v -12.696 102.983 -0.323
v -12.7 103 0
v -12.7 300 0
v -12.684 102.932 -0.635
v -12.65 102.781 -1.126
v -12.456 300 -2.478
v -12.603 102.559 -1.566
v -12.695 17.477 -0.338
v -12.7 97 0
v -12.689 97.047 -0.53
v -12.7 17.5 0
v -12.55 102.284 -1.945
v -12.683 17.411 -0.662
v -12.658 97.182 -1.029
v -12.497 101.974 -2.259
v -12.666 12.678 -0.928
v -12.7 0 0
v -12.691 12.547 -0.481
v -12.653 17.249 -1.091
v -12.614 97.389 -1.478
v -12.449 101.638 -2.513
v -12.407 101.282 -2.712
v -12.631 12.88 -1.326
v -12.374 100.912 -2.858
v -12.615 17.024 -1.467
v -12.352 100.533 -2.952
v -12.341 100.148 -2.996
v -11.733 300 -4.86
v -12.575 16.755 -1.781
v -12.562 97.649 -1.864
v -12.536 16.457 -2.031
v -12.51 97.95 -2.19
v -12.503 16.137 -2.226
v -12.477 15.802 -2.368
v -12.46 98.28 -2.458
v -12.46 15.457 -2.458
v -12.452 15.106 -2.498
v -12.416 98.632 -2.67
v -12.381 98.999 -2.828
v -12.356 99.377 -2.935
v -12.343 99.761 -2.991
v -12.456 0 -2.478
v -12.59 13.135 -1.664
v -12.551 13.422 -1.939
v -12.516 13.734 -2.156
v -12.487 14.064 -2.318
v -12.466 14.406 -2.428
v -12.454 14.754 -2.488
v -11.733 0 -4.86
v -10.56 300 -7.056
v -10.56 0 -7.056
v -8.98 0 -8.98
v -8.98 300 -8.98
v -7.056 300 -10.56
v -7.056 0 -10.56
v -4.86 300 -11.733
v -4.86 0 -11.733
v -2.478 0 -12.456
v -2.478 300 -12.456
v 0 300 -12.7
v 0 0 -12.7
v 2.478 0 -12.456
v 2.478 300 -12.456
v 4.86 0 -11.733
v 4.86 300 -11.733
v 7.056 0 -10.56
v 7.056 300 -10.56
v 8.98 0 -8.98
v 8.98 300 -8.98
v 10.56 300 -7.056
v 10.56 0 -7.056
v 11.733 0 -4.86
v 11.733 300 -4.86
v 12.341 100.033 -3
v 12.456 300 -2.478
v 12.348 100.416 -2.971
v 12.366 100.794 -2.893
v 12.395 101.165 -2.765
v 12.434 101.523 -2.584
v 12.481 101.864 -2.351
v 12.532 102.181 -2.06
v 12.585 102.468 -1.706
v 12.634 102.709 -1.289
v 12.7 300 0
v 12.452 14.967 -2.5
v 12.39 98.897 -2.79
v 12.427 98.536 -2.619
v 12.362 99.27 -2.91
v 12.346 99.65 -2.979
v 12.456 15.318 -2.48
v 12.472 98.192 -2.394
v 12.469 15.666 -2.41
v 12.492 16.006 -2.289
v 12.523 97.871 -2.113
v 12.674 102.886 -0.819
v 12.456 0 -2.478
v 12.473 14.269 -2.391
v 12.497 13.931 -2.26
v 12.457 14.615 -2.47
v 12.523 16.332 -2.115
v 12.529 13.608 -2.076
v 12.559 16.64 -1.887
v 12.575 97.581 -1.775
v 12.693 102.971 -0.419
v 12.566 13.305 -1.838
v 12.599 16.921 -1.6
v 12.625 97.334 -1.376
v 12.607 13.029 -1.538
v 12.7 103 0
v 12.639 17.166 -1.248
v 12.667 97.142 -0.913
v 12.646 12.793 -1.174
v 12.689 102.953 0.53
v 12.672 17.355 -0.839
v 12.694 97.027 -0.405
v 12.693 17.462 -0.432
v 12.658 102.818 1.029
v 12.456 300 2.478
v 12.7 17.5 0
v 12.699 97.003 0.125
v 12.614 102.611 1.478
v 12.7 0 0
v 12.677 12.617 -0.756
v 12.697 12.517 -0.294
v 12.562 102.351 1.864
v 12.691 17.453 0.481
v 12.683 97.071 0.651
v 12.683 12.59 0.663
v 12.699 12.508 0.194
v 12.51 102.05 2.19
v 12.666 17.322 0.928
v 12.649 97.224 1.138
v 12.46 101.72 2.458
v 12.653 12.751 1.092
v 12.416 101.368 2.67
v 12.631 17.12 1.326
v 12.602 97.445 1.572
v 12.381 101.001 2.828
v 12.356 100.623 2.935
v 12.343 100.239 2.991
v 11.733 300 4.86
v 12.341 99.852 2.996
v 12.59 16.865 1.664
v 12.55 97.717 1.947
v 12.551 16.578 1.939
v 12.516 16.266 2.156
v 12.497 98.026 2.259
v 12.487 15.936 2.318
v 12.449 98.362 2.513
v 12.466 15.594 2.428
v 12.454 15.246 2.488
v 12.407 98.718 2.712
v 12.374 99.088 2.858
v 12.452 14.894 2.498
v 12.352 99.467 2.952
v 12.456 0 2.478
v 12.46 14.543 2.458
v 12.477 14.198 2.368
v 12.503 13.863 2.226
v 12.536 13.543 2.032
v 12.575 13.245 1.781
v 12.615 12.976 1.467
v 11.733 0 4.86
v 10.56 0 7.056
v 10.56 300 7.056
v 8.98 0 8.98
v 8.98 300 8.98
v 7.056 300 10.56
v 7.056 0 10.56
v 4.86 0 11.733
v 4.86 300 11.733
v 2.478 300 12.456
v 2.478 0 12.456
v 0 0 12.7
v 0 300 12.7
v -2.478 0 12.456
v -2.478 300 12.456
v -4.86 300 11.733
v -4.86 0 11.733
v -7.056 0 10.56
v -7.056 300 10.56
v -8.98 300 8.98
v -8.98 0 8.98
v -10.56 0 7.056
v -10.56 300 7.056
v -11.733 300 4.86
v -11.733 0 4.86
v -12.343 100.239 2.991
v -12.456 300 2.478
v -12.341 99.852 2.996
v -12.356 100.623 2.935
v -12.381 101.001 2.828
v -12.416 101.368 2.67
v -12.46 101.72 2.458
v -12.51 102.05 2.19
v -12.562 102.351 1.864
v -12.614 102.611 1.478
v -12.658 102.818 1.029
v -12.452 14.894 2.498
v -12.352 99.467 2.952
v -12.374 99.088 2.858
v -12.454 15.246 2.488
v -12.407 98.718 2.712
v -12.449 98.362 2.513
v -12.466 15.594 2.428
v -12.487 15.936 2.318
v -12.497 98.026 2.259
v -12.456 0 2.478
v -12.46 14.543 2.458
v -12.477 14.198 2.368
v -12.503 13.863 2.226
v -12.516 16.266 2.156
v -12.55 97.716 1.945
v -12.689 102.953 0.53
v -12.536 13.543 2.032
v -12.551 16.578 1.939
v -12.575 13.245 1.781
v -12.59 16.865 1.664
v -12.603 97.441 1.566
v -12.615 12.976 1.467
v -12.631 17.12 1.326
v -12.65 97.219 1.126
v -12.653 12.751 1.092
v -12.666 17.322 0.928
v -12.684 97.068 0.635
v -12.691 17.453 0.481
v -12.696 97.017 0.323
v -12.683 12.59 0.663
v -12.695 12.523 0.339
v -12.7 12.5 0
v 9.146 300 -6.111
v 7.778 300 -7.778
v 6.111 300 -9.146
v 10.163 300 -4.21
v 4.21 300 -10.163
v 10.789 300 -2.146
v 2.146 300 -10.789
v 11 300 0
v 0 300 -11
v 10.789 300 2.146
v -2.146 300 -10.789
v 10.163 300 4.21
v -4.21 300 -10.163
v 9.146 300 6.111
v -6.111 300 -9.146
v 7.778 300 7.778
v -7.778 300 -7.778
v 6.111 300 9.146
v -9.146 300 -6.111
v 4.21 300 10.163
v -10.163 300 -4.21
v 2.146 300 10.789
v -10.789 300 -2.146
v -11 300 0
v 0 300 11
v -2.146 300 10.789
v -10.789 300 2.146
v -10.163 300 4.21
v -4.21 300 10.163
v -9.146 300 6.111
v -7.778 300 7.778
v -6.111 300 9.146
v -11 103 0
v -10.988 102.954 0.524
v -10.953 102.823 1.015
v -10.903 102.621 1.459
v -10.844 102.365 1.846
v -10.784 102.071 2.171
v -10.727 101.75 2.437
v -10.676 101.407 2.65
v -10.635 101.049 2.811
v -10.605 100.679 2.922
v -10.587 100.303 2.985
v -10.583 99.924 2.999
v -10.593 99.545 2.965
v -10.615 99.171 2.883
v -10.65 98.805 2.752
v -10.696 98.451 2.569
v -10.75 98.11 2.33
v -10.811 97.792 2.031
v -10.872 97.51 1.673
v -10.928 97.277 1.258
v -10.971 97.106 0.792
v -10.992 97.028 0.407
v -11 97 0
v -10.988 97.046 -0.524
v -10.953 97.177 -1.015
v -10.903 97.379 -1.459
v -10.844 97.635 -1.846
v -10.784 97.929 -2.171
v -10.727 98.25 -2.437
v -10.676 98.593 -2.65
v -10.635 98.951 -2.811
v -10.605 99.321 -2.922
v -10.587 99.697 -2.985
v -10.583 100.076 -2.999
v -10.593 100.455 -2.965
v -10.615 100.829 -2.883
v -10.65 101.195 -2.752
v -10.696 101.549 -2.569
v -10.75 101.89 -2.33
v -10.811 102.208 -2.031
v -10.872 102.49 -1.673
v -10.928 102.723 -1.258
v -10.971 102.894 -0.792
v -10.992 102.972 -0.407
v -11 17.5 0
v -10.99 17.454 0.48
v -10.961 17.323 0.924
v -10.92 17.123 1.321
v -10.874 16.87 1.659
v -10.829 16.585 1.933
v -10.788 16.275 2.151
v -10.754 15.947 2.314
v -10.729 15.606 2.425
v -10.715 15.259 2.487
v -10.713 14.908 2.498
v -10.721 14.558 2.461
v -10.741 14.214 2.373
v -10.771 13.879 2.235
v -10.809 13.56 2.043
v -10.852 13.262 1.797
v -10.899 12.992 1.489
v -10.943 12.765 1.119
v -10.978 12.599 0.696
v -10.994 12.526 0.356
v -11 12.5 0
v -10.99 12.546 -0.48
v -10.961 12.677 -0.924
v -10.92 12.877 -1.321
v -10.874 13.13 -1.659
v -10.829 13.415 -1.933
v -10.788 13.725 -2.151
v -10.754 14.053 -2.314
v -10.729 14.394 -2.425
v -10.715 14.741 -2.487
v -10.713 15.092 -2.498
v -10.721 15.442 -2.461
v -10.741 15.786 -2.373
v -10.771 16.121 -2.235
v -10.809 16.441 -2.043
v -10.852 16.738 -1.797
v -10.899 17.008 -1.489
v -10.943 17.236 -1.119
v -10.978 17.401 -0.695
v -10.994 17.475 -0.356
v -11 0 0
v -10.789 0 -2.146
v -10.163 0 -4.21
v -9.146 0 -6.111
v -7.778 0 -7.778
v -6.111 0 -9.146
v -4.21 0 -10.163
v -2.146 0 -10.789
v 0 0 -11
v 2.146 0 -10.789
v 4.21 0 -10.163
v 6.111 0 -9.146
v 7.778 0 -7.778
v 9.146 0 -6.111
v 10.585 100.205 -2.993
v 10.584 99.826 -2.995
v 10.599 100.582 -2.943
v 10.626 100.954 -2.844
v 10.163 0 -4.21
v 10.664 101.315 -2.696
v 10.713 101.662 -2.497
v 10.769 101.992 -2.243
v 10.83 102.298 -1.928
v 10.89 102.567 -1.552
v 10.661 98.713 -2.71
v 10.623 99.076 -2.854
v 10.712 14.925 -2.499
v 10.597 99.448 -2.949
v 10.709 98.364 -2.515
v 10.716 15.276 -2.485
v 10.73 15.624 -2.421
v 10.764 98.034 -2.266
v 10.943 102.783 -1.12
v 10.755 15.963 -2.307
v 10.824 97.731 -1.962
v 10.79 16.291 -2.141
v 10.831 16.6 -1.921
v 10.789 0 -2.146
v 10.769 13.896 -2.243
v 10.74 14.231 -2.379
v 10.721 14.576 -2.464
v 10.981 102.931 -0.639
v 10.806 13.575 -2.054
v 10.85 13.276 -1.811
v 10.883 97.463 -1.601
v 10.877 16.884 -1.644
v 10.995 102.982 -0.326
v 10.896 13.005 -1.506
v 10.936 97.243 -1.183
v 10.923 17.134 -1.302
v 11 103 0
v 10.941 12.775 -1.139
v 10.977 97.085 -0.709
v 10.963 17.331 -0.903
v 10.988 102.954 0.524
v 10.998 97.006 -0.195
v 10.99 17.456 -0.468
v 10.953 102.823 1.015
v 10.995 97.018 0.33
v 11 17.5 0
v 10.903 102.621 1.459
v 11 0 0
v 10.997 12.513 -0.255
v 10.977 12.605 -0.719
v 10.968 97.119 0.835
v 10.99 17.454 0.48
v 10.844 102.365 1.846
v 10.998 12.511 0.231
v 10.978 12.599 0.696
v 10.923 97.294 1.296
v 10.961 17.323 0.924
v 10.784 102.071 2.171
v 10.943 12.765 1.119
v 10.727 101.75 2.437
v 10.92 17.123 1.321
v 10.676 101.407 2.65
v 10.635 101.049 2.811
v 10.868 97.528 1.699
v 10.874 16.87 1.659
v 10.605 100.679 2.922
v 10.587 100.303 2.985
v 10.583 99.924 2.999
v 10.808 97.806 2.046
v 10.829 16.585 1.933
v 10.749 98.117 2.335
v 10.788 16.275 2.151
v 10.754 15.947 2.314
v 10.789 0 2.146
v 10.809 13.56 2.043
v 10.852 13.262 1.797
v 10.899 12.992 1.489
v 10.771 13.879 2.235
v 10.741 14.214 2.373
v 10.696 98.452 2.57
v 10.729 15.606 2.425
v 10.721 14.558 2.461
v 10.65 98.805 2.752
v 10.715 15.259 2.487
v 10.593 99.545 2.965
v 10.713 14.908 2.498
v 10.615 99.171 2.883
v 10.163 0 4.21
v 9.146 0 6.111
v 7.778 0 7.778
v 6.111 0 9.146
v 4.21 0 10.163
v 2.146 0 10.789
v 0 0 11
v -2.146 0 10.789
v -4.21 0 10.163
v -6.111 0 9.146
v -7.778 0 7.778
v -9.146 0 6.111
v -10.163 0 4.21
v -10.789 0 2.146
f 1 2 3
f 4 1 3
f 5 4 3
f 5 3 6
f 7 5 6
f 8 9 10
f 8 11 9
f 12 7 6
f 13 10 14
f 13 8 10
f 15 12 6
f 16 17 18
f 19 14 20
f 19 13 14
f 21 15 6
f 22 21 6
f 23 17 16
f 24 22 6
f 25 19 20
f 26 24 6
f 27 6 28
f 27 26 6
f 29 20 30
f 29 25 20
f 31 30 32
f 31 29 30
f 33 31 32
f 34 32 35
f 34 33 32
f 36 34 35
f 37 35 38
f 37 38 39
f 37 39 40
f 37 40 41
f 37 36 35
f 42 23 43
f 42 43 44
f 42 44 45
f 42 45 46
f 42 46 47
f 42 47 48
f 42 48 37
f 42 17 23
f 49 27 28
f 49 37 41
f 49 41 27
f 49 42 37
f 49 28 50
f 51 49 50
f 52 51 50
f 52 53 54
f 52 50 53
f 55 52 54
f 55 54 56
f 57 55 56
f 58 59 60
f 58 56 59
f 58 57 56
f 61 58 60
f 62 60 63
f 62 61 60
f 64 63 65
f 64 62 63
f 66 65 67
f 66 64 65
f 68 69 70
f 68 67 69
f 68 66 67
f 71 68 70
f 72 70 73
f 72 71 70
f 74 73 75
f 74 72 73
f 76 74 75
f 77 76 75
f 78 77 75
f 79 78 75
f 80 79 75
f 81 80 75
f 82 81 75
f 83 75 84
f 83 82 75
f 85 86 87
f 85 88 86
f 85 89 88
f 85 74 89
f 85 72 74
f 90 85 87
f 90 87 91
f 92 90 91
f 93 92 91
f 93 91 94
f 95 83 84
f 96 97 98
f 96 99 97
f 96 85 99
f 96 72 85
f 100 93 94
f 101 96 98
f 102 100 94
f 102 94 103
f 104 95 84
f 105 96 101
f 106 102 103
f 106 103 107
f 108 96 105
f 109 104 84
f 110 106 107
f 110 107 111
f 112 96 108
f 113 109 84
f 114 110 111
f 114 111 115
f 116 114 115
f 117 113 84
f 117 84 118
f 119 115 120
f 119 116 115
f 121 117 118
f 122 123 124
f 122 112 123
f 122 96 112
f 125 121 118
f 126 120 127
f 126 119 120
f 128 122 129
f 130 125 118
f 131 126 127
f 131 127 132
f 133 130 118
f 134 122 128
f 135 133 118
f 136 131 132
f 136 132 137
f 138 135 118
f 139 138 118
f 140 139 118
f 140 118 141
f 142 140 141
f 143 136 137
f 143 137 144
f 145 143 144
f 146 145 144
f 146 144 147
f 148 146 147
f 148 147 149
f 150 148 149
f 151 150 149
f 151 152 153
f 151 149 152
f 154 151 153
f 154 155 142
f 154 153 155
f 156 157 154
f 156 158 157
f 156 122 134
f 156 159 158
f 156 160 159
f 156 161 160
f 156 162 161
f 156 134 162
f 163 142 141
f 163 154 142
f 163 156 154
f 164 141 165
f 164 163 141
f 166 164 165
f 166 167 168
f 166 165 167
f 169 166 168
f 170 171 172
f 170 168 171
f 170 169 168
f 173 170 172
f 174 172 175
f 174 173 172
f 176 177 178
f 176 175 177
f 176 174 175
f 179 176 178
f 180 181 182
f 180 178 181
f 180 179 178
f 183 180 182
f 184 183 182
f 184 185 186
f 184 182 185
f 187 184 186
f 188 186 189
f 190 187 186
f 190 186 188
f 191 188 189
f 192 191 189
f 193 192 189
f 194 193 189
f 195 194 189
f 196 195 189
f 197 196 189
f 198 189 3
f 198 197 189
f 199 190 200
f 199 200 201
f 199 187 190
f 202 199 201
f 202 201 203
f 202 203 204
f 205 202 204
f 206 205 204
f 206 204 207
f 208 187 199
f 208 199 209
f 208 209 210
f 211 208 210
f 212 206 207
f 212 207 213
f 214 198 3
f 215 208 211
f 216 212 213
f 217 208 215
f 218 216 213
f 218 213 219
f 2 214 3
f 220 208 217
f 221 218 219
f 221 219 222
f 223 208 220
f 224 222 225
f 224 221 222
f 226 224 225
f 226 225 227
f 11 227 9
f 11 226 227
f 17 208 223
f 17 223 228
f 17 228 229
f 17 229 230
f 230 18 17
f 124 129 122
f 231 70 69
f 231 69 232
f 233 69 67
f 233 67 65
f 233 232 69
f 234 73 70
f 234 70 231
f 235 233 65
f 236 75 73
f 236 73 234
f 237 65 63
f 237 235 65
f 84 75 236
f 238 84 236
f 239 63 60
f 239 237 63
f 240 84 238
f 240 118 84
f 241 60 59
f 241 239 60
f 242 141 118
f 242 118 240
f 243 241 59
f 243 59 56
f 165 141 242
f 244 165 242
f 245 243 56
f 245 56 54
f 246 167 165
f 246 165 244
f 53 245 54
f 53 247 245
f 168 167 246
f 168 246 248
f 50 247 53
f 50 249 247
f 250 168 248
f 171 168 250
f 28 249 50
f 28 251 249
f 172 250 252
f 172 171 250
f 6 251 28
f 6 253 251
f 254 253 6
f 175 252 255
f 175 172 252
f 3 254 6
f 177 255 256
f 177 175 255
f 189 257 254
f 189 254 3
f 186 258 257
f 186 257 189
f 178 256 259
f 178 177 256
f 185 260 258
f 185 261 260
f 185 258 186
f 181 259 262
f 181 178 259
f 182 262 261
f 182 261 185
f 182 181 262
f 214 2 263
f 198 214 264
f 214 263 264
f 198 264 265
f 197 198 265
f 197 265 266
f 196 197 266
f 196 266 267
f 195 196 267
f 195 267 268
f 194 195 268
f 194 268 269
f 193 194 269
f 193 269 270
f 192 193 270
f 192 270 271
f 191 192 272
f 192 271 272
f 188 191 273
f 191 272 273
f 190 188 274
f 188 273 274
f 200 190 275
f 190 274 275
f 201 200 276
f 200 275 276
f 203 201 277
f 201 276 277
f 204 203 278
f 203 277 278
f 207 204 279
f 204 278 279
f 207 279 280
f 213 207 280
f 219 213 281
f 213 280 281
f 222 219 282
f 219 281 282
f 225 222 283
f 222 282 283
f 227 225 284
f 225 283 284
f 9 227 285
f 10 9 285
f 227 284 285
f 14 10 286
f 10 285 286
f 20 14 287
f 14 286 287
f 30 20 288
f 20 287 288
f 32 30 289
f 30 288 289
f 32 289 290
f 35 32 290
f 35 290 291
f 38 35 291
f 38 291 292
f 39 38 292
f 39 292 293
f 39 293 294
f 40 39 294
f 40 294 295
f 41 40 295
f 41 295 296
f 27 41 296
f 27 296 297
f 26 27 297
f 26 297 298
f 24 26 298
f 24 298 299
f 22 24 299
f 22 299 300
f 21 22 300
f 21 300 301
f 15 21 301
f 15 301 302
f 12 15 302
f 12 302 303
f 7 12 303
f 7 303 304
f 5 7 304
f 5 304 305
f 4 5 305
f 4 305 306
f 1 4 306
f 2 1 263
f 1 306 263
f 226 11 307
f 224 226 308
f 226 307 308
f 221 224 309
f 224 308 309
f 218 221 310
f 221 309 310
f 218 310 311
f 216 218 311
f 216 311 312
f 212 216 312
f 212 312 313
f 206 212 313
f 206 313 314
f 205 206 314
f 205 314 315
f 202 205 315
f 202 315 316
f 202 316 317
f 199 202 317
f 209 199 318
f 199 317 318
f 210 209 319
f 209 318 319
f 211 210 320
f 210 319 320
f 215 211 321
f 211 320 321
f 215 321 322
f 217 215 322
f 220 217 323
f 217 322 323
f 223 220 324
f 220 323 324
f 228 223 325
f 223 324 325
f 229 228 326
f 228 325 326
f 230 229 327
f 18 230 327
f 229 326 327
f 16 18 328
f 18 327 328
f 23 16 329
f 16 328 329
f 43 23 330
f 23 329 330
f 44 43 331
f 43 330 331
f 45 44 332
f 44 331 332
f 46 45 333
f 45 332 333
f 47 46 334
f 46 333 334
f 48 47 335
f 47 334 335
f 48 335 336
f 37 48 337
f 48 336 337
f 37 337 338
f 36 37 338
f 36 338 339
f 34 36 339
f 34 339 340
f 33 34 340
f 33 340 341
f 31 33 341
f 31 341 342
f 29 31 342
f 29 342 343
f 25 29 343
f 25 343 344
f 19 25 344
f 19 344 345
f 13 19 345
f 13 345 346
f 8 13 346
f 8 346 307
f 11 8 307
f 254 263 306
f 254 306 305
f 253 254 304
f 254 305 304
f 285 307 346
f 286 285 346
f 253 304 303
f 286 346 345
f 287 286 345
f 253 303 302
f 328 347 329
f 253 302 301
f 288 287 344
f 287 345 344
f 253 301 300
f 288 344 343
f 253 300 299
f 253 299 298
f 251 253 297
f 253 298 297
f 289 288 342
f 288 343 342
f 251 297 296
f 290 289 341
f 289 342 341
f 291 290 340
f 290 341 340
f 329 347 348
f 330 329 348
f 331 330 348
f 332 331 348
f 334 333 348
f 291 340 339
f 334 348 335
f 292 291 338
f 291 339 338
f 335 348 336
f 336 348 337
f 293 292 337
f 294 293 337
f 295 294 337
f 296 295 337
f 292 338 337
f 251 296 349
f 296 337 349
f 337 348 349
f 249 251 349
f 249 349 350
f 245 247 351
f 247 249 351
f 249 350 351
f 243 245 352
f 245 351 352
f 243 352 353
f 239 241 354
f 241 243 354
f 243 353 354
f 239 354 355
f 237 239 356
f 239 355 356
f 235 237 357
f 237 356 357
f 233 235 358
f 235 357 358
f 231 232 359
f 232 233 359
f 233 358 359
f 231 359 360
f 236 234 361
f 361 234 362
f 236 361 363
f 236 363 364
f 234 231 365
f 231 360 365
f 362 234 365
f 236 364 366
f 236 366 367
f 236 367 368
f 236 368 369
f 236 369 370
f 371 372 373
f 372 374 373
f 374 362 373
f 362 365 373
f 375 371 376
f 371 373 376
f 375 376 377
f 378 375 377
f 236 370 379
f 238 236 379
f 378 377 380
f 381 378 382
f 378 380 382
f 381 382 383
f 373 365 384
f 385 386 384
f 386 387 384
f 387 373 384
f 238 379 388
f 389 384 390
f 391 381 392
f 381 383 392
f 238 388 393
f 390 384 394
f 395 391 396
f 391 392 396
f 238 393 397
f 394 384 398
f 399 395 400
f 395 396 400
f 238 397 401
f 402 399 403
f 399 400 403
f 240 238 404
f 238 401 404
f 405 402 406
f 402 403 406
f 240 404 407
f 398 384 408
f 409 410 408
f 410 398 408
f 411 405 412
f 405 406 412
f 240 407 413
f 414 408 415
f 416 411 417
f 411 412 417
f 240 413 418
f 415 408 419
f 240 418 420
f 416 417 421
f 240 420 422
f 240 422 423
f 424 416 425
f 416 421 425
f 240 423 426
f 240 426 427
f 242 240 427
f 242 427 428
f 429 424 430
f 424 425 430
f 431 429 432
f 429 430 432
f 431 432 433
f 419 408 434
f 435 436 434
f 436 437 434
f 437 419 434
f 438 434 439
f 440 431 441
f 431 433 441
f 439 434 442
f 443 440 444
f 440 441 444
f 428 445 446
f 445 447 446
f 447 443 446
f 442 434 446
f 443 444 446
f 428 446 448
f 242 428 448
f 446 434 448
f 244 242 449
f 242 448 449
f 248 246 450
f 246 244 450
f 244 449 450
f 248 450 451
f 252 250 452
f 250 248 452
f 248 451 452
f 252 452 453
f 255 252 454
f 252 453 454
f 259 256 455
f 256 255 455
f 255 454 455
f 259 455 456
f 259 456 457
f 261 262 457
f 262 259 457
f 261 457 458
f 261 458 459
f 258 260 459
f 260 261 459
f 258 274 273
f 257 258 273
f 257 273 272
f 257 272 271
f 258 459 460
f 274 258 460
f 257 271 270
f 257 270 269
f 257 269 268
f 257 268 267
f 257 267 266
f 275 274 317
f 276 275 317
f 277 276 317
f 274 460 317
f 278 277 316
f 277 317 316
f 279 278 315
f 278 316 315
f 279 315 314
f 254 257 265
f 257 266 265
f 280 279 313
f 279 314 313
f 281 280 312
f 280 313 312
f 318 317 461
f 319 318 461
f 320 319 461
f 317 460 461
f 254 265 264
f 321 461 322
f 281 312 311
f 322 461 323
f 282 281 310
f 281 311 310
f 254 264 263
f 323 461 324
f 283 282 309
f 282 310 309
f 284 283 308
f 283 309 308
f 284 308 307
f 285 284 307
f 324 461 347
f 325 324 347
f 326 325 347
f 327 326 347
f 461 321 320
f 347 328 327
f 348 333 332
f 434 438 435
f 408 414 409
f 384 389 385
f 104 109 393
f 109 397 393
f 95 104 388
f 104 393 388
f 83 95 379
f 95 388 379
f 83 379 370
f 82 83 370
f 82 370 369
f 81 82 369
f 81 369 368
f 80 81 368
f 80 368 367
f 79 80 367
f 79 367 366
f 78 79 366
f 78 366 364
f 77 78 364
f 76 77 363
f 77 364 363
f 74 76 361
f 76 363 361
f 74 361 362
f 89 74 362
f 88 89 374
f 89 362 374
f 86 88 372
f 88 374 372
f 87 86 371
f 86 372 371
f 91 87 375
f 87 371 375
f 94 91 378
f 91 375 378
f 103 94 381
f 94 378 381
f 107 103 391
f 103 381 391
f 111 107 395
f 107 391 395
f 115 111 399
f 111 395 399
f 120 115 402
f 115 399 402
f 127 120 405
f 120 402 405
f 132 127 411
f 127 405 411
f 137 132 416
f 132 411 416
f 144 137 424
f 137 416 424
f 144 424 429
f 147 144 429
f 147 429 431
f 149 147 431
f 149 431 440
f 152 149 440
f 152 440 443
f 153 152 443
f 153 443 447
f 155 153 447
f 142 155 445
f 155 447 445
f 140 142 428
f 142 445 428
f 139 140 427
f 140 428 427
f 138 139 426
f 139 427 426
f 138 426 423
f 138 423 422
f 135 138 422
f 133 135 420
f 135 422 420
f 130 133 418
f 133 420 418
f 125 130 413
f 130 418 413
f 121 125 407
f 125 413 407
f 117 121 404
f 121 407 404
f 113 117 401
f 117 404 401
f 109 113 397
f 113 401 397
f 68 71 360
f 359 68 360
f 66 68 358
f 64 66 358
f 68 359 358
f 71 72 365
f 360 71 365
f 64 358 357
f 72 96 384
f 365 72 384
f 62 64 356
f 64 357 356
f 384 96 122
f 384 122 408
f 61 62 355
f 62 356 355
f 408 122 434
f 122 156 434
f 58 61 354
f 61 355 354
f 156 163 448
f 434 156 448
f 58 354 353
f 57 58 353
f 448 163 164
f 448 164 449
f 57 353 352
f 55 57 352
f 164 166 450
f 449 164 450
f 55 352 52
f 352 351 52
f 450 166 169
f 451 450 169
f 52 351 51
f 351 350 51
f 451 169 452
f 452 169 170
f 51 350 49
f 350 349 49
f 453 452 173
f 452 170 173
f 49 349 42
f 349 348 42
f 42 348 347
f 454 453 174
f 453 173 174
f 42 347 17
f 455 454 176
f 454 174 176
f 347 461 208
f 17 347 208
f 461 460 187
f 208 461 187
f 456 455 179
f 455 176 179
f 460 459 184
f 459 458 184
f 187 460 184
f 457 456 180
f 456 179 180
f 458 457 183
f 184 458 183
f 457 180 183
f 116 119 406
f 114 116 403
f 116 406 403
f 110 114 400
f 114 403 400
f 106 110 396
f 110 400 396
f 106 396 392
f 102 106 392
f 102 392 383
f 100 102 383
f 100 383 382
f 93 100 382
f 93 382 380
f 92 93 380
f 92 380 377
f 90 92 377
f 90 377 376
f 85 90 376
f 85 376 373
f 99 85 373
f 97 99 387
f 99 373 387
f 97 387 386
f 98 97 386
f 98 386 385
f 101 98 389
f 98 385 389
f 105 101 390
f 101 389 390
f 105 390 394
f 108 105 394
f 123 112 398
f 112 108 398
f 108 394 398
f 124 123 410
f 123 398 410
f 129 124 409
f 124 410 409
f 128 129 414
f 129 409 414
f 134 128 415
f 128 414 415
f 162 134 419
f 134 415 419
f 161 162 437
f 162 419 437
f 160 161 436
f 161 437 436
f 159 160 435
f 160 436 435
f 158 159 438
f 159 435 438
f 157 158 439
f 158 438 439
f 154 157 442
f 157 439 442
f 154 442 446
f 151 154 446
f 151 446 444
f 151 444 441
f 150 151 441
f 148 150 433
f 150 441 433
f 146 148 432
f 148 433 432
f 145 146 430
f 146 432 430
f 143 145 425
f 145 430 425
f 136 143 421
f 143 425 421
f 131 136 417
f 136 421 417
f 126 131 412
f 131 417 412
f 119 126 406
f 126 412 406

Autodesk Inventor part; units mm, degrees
ref_plane "YZ Plane" through (0, 0, 0) normal (1, 0, 0) x (0, 1, 0)
ref_plane "XZ Plane" through (0, 0, 0) normal (0, 1, 0) x (-1, 0, 0)
ref_plane "XY Plane" through (0, 0, 0) normal (0, 0, 1) x (1, 0, 0)
sketch "Sketch1" plane through (0, 0, 0) normal (0, 1, 0) x (-1, 0, 0)
  circle A0 centre (0, 0) radius 12.7
  circle A1 centre (0, 0) radius 11
  dimension "d0" = 25.4
  dimension "d1" = 22
extrude "Extrusion1" add sketch "Sketch1" along normal blind 300
sketch "Sketch2" plane through (0, 0, 0) normal (1, 0, 0) x (0, 1, 0)
  circle A0 centre (100, 0) radius 3
  line L0 (0, -12.7) -> (0, 12.7) projected
  circle A1 centre (15, 0) radius 2.5
  point P0 (0, 0)
  dimension "d4" = 6
  dimension "d5" = 100
  dimension "d6" = 5
  dimension "d7" = 15
extrude "Extrusion2" cut sketch "Sketch2" along normal mid plane 300
properties part number "stickshift"
